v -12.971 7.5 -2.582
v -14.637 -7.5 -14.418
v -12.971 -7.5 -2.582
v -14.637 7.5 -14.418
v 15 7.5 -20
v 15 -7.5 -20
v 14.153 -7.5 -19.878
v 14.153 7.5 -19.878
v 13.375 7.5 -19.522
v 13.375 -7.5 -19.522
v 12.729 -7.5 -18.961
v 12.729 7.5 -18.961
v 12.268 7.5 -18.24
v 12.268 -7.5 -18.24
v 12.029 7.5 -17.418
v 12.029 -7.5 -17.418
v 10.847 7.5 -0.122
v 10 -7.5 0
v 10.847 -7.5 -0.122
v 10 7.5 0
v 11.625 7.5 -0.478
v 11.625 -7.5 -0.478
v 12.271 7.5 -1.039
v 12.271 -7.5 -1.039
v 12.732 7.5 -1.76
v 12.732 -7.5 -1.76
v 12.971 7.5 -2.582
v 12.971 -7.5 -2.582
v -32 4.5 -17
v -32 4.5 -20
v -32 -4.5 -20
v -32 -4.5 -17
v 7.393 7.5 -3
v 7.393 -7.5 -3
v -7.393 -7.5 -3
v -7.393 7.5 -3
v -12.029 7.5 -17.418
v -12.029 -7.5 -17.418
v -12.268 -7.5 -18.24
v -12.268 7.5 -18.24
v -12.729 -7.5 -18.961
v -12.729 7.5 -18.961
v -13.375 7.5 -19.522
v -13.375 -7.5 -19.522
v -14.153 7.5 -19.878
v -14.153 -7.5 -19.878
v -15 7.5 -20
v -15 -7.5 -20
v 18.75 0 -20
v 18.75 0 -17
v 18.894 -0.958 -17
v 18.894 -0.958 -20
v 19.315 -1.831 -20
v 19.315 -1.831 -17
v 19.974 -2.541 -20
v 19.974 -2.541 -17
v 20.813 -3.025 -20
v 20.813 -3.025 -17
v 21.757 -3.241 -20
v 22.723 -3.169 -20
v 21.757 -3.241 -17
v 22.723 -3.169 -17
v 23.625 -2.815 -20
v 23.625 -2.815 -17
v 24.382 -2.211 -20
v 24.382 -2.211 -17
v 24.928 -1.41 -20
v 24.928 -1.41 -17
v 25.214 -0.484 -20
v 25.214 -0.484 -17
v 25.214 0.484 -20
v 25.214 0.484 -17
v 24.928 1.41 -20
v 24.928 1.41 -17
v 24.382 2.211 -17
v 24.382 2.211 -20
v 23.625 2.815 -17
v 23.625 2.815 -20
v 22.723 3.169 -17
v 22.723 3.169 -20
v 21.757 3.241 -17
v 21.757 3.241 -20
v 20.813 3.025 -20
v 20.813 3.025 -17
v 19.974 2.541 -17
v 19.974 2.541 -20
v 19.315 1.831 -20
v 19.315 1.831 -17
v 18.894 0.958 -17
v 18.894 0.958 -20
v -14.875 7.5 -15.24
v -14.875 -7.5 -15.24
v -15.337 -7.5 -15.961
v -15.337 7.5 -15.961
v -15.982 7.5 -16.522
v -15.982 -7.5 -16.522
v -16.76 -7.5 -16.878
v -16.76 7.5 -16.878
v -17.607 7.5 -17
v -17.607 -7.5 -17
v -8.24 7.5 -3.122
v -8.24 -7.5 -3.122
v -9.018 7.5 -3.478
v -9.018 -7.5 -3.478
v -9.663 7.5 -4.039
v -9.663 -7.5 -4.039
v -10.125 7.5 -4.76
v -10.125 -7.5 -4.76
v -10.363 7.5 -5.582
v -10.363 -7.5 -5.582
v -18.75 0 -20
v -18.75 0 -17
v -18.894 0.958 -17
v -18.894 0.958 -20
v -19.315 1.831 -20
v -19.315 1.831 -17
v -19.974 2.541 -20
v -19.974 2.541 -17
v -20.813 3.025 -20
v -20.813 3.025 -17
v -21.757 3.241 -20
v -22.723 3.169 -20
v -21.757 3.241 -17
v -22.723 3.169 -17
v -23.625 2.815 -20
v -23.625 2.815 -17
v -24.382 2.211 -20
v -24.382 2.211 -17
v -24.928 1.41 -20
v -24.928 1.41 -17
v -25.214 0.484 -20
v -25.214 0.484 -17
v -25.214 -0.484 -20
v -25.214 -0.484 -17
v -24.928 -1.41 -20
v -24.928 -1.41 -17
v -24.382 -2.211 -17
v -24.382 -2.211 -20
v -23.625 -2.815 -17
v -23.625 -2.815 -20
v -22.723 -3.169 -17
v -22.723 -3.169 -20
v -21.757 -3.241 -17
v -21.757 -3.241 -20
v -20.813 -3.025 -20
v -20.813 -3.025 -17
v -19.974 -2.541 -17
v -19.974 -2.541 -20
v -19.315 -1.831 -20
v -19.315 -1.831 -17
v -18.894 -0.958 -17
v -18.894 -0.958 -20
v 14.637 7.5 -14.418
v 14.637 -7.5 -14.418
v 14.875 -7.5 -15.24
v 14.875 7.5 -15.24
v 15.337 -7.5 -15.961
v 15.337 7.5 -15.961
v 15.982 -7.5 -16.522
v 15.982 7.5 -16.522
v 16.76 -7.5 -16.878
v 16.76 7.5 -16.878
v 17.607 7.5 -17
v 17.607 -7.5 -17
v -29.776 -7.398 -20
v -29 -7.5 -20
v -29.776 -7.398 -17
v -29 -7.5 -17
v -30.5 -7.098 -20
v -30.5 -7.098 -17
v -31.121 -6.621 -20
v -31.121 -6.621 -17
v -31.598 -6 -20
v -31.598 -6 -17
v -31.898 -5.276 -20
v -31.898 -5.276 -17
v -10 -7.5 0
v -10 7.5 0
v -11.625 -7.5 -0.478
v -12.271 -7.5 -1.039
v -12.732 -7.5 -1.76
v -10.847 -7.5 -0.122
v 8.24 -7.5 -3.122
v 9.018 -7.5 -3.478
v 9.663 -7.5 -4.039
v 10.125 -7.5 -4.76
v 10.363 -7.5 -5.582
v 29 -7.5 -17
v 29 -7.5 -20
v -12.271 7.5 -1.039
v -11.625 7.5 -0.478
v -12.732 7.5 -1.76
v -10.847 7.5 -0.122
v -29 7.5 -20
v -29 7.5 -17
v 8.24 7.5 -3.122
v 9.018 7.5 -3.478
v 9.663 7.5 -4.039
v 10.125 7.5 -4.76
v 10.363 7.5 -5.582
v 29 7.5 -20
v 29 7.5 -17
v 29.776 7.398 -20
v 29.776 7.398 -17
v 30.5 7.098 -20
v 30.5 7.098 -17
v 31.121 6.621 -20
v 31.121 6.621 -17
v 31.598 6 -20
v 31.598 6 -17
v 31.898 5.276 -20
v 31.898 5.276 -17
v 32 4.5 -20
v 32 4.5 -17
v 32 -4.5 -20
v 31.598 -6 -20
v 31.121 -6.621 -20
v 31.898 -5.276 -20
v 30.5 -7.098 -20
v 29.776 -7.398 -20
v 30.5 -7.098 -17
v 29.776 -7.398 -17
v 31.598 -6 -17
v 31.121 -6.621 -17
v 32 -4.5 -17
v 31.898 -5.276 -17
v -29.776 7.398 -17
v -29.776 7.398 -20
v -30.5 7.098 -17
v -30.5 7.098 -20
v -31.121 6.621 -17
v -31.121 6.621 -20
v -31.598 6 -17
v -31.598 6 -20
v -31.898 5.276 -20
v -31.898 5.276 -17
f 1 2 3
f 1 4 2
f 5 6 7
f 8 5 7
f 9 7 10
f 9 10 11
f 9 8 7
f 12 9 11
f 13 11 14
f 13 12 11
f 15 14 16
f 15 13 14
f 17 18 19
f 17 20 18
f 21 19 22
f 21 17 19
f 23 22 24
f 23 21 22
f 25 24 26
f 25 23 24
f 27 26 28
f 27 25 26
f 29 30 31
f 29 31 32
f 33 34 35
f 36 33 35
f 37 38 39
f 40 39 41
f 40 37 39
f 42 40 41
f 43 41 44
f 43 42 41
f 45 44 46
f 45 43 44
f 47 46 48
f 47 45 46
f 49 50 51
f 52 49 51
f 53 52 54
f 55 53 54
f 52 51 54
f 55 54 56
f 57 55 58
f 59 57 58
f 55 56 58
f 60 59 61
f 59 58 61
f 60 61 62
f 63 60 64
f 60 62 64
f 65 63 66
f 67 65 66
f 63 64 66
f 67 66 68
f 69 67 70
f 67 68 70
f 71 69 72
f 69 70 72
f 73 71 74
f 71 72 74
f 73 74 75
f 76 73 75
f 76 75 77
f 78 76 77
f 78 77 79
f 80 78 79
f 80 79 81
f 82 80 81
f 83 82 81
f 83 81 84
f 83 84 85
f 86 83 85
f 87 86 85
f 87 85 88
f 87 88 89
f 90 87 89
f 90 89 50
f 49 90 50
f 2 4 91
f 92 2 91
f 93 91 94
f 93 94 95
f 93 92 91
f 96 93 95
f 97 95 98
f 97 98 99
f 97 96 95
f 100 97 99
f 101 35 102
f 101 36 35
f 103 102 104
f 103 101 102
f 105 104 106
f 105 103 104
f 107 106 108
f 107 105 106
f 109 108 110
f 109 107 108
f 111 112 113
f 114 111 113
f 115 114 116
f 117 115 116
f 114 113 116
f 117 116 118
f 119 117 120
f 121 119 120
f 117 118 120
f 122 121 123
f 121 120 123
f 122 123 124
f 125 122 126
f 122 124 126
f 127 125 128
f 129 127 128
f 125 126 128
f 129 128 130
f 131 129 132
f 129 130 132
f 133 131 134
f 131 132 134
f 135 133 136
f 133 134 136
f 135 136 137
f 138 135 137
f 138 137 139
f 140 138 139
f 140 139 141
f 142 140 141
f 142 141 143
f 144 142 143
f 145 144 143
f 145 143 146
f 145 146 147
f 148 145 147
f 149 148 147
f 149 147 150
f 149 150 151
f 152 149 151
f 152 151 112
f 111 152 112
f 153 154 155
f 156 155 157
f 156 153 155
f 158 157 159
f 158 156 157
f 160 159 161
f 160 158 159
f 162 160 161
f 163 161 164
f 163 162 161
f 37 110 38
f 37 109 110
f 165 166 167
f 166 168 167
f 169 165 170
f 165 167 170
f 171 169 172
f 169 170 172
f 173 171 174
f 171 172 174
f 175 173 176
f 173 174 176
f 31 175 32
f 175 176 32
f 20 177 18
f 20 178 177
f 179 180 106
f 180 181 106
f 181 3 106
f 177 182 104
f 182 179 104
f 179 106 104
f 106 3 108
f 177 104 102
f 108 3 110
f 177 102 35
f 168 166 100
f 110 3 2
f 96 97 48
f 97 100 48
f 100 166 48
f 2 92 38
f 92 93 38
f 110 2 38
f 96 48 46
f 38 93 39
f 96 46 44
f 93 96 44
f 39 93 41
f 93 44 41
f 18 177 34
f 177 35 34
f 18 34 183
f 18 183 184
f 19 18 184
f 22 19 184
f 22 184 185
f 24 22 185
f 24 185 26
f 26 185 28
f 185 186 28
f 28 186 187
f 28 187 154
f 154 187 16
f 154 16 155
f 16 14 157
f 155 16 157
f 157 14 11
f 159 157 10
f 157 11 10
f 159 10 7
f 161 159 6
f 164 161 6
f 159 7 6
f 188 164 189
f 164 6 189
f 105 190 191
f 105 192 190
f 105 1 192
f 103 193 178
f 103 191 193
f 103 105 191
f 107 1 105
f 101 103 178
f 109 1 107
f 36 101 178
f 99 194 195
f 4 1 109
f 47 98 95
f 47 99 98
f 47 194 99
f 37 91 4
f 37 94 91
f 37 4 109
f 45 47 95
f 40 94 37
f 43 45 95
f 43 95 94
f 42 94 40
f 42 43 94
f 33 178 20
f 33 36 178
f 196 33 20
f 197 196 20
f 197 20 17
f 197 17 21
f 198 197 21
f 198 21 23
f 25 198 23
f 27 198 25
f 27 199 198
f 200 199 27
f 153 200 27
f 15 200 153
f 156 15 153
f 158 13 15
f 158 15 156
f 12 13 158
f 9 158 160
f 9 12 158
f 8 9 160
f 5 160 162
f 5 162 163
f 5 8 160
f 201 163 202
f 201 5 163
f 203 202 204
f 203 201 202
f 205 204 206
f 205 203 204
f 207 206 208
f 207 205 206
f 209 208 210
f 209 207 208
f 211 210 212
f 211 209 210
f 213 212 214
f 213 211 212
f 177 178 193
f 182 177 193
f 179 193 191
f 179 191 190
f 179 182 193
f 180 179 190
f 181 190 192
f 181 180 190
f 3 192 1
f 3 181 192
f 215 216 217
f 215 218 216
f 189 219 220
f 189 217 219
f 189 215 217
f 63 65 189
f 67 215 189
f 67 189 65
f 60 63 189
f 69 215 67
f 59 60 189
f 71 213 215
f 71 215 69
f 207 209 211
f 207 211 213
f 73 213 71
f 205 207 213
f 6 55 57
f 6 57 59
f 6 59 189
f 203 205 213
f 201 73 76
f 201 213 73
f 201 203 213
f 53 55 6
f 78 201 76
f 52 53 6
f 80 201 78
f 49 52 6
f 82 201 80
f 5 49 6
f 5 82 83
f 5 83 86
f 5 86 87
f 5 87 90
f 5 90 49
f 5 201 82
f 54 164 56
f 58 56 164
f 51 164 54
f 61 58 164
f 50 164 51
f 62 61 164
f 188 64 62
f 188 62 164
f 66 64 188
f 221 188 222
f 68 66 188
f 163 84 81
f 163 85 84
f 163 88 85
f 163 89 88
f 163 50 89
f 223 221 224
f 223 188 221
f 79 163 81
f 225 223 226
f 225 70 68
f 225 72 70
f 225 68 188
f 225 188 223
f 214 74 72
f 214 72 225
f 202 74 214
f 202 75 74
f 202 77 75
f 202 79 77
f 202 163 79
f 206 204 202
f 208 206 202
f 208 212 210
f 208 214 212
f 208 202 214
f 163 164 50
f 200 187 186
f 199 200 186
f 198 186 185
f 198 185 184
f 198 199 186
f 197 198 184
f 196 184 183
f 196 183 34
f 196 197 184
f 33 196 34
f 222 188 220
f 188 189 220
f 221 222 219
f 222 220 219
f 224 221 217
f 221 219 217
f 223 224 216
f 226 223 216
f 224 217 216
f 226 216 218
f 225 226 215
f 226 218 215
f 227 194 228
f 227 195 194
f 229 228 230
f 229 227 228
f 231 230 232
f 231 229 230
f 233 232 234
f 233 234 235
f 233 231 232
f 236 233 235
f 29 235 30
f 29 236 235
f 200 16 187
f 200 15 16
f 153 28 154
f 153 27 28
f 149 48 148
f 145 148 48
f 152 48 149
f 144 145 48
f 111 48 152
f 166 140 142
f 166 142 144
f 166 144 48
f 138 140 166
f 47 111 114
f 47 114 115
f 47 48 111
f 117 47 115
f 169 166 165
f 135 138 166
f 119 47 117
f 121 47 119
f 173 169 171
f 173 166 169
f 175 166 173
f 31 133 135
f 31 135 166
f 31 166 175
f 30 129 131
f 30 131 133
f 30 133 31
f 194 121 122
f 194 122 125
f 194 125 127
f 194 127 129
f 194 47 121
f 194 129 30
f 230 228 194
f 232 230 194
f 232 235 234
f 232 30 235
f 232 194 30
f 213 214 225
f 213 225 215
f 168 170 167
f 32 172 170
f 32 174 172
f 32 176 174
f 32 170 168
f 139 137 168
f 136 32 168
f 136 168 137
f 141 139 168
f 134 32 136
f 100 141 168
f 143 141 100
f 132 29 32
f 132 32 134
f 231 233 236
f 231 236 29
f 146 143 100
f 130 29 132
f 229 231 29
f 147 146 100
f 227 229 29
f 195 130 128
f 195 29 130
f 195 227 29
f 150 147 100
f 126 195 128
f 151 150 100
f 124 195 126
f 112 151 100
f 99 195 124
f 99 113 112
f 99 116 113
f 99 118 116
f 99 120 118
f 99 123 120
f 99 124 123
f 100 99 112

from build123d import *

# Parameters (mm, degrees)
EXTRUDE_1_DEPTH     = 7.5
SKETCH_2_R          = 3.25
CUT_EXTRUDE_1_DEPTH = 38.003378224
FILLET_1_R          = 3
FILLET_2_R          = 3


with BuildPart() as part:
    # 草图1 → 凸台-拉伸1 (new, symmetric)
    with BuildSketch(Plane(origin=(0, 0, 0), x_dir=(1, 0, 0), z_dir=(0, 1, 0))):
        Polygon((-12.607332667, 0), (12.607332667, 0), (15, 17), (32, 17), (32, 20), (12.392667333, 20), (10, 3), (-10, 3), (-12.392667333, 20), (-32, 20), (-32, 17), (-15, 17), align=None)
    extrude(amount=EXTRUDE_1_DEPTH, both=True)

    # 草图2 → 切除-拉伸1 (cut, through all)
    with BuildSketch(Plane.XY.offset(-17)):
        with Locations((-22, 0)):
            Circle(SKETCH_2_R)
        with Locations(Location((22, 0, 0), (0, 0, 180))):
            Circle(SKETCH_2_R)
    extrude(amount=-CUT_EXTRUDE_1_DEPTH, mode=Mode.SUBTRACT)

    # 圆角1
    fillet_1_edges = [part.edges().sort_by_distance(p)[0] for p in [
        (15, 0, -17),
        (12.607332667, 0, 0),
        (-12.607332667, 0, 0),
        (-15, 0, -17),
        (-12.392667333, 0, -20),
        (-10, 0, -3),
        (10, 0, -3),
        (12.392667333, 0, -20),
    ]]
    fillet(fillet_1_edges, radius=FILLET_1_R)

    # 圆角2
    fillet_2_edges = [part.edges().sort_by_distance(p)[0] for p in [
        (-32, -7.5, -18.5),
        (32, -7.5, -18.5),
        (-32, 7.5, -18.5),
        (32, 7.5, -18.5),
    ]]
    fillet(fillet_2_edges, radius=FILLET_2_R)


solid = part.part
